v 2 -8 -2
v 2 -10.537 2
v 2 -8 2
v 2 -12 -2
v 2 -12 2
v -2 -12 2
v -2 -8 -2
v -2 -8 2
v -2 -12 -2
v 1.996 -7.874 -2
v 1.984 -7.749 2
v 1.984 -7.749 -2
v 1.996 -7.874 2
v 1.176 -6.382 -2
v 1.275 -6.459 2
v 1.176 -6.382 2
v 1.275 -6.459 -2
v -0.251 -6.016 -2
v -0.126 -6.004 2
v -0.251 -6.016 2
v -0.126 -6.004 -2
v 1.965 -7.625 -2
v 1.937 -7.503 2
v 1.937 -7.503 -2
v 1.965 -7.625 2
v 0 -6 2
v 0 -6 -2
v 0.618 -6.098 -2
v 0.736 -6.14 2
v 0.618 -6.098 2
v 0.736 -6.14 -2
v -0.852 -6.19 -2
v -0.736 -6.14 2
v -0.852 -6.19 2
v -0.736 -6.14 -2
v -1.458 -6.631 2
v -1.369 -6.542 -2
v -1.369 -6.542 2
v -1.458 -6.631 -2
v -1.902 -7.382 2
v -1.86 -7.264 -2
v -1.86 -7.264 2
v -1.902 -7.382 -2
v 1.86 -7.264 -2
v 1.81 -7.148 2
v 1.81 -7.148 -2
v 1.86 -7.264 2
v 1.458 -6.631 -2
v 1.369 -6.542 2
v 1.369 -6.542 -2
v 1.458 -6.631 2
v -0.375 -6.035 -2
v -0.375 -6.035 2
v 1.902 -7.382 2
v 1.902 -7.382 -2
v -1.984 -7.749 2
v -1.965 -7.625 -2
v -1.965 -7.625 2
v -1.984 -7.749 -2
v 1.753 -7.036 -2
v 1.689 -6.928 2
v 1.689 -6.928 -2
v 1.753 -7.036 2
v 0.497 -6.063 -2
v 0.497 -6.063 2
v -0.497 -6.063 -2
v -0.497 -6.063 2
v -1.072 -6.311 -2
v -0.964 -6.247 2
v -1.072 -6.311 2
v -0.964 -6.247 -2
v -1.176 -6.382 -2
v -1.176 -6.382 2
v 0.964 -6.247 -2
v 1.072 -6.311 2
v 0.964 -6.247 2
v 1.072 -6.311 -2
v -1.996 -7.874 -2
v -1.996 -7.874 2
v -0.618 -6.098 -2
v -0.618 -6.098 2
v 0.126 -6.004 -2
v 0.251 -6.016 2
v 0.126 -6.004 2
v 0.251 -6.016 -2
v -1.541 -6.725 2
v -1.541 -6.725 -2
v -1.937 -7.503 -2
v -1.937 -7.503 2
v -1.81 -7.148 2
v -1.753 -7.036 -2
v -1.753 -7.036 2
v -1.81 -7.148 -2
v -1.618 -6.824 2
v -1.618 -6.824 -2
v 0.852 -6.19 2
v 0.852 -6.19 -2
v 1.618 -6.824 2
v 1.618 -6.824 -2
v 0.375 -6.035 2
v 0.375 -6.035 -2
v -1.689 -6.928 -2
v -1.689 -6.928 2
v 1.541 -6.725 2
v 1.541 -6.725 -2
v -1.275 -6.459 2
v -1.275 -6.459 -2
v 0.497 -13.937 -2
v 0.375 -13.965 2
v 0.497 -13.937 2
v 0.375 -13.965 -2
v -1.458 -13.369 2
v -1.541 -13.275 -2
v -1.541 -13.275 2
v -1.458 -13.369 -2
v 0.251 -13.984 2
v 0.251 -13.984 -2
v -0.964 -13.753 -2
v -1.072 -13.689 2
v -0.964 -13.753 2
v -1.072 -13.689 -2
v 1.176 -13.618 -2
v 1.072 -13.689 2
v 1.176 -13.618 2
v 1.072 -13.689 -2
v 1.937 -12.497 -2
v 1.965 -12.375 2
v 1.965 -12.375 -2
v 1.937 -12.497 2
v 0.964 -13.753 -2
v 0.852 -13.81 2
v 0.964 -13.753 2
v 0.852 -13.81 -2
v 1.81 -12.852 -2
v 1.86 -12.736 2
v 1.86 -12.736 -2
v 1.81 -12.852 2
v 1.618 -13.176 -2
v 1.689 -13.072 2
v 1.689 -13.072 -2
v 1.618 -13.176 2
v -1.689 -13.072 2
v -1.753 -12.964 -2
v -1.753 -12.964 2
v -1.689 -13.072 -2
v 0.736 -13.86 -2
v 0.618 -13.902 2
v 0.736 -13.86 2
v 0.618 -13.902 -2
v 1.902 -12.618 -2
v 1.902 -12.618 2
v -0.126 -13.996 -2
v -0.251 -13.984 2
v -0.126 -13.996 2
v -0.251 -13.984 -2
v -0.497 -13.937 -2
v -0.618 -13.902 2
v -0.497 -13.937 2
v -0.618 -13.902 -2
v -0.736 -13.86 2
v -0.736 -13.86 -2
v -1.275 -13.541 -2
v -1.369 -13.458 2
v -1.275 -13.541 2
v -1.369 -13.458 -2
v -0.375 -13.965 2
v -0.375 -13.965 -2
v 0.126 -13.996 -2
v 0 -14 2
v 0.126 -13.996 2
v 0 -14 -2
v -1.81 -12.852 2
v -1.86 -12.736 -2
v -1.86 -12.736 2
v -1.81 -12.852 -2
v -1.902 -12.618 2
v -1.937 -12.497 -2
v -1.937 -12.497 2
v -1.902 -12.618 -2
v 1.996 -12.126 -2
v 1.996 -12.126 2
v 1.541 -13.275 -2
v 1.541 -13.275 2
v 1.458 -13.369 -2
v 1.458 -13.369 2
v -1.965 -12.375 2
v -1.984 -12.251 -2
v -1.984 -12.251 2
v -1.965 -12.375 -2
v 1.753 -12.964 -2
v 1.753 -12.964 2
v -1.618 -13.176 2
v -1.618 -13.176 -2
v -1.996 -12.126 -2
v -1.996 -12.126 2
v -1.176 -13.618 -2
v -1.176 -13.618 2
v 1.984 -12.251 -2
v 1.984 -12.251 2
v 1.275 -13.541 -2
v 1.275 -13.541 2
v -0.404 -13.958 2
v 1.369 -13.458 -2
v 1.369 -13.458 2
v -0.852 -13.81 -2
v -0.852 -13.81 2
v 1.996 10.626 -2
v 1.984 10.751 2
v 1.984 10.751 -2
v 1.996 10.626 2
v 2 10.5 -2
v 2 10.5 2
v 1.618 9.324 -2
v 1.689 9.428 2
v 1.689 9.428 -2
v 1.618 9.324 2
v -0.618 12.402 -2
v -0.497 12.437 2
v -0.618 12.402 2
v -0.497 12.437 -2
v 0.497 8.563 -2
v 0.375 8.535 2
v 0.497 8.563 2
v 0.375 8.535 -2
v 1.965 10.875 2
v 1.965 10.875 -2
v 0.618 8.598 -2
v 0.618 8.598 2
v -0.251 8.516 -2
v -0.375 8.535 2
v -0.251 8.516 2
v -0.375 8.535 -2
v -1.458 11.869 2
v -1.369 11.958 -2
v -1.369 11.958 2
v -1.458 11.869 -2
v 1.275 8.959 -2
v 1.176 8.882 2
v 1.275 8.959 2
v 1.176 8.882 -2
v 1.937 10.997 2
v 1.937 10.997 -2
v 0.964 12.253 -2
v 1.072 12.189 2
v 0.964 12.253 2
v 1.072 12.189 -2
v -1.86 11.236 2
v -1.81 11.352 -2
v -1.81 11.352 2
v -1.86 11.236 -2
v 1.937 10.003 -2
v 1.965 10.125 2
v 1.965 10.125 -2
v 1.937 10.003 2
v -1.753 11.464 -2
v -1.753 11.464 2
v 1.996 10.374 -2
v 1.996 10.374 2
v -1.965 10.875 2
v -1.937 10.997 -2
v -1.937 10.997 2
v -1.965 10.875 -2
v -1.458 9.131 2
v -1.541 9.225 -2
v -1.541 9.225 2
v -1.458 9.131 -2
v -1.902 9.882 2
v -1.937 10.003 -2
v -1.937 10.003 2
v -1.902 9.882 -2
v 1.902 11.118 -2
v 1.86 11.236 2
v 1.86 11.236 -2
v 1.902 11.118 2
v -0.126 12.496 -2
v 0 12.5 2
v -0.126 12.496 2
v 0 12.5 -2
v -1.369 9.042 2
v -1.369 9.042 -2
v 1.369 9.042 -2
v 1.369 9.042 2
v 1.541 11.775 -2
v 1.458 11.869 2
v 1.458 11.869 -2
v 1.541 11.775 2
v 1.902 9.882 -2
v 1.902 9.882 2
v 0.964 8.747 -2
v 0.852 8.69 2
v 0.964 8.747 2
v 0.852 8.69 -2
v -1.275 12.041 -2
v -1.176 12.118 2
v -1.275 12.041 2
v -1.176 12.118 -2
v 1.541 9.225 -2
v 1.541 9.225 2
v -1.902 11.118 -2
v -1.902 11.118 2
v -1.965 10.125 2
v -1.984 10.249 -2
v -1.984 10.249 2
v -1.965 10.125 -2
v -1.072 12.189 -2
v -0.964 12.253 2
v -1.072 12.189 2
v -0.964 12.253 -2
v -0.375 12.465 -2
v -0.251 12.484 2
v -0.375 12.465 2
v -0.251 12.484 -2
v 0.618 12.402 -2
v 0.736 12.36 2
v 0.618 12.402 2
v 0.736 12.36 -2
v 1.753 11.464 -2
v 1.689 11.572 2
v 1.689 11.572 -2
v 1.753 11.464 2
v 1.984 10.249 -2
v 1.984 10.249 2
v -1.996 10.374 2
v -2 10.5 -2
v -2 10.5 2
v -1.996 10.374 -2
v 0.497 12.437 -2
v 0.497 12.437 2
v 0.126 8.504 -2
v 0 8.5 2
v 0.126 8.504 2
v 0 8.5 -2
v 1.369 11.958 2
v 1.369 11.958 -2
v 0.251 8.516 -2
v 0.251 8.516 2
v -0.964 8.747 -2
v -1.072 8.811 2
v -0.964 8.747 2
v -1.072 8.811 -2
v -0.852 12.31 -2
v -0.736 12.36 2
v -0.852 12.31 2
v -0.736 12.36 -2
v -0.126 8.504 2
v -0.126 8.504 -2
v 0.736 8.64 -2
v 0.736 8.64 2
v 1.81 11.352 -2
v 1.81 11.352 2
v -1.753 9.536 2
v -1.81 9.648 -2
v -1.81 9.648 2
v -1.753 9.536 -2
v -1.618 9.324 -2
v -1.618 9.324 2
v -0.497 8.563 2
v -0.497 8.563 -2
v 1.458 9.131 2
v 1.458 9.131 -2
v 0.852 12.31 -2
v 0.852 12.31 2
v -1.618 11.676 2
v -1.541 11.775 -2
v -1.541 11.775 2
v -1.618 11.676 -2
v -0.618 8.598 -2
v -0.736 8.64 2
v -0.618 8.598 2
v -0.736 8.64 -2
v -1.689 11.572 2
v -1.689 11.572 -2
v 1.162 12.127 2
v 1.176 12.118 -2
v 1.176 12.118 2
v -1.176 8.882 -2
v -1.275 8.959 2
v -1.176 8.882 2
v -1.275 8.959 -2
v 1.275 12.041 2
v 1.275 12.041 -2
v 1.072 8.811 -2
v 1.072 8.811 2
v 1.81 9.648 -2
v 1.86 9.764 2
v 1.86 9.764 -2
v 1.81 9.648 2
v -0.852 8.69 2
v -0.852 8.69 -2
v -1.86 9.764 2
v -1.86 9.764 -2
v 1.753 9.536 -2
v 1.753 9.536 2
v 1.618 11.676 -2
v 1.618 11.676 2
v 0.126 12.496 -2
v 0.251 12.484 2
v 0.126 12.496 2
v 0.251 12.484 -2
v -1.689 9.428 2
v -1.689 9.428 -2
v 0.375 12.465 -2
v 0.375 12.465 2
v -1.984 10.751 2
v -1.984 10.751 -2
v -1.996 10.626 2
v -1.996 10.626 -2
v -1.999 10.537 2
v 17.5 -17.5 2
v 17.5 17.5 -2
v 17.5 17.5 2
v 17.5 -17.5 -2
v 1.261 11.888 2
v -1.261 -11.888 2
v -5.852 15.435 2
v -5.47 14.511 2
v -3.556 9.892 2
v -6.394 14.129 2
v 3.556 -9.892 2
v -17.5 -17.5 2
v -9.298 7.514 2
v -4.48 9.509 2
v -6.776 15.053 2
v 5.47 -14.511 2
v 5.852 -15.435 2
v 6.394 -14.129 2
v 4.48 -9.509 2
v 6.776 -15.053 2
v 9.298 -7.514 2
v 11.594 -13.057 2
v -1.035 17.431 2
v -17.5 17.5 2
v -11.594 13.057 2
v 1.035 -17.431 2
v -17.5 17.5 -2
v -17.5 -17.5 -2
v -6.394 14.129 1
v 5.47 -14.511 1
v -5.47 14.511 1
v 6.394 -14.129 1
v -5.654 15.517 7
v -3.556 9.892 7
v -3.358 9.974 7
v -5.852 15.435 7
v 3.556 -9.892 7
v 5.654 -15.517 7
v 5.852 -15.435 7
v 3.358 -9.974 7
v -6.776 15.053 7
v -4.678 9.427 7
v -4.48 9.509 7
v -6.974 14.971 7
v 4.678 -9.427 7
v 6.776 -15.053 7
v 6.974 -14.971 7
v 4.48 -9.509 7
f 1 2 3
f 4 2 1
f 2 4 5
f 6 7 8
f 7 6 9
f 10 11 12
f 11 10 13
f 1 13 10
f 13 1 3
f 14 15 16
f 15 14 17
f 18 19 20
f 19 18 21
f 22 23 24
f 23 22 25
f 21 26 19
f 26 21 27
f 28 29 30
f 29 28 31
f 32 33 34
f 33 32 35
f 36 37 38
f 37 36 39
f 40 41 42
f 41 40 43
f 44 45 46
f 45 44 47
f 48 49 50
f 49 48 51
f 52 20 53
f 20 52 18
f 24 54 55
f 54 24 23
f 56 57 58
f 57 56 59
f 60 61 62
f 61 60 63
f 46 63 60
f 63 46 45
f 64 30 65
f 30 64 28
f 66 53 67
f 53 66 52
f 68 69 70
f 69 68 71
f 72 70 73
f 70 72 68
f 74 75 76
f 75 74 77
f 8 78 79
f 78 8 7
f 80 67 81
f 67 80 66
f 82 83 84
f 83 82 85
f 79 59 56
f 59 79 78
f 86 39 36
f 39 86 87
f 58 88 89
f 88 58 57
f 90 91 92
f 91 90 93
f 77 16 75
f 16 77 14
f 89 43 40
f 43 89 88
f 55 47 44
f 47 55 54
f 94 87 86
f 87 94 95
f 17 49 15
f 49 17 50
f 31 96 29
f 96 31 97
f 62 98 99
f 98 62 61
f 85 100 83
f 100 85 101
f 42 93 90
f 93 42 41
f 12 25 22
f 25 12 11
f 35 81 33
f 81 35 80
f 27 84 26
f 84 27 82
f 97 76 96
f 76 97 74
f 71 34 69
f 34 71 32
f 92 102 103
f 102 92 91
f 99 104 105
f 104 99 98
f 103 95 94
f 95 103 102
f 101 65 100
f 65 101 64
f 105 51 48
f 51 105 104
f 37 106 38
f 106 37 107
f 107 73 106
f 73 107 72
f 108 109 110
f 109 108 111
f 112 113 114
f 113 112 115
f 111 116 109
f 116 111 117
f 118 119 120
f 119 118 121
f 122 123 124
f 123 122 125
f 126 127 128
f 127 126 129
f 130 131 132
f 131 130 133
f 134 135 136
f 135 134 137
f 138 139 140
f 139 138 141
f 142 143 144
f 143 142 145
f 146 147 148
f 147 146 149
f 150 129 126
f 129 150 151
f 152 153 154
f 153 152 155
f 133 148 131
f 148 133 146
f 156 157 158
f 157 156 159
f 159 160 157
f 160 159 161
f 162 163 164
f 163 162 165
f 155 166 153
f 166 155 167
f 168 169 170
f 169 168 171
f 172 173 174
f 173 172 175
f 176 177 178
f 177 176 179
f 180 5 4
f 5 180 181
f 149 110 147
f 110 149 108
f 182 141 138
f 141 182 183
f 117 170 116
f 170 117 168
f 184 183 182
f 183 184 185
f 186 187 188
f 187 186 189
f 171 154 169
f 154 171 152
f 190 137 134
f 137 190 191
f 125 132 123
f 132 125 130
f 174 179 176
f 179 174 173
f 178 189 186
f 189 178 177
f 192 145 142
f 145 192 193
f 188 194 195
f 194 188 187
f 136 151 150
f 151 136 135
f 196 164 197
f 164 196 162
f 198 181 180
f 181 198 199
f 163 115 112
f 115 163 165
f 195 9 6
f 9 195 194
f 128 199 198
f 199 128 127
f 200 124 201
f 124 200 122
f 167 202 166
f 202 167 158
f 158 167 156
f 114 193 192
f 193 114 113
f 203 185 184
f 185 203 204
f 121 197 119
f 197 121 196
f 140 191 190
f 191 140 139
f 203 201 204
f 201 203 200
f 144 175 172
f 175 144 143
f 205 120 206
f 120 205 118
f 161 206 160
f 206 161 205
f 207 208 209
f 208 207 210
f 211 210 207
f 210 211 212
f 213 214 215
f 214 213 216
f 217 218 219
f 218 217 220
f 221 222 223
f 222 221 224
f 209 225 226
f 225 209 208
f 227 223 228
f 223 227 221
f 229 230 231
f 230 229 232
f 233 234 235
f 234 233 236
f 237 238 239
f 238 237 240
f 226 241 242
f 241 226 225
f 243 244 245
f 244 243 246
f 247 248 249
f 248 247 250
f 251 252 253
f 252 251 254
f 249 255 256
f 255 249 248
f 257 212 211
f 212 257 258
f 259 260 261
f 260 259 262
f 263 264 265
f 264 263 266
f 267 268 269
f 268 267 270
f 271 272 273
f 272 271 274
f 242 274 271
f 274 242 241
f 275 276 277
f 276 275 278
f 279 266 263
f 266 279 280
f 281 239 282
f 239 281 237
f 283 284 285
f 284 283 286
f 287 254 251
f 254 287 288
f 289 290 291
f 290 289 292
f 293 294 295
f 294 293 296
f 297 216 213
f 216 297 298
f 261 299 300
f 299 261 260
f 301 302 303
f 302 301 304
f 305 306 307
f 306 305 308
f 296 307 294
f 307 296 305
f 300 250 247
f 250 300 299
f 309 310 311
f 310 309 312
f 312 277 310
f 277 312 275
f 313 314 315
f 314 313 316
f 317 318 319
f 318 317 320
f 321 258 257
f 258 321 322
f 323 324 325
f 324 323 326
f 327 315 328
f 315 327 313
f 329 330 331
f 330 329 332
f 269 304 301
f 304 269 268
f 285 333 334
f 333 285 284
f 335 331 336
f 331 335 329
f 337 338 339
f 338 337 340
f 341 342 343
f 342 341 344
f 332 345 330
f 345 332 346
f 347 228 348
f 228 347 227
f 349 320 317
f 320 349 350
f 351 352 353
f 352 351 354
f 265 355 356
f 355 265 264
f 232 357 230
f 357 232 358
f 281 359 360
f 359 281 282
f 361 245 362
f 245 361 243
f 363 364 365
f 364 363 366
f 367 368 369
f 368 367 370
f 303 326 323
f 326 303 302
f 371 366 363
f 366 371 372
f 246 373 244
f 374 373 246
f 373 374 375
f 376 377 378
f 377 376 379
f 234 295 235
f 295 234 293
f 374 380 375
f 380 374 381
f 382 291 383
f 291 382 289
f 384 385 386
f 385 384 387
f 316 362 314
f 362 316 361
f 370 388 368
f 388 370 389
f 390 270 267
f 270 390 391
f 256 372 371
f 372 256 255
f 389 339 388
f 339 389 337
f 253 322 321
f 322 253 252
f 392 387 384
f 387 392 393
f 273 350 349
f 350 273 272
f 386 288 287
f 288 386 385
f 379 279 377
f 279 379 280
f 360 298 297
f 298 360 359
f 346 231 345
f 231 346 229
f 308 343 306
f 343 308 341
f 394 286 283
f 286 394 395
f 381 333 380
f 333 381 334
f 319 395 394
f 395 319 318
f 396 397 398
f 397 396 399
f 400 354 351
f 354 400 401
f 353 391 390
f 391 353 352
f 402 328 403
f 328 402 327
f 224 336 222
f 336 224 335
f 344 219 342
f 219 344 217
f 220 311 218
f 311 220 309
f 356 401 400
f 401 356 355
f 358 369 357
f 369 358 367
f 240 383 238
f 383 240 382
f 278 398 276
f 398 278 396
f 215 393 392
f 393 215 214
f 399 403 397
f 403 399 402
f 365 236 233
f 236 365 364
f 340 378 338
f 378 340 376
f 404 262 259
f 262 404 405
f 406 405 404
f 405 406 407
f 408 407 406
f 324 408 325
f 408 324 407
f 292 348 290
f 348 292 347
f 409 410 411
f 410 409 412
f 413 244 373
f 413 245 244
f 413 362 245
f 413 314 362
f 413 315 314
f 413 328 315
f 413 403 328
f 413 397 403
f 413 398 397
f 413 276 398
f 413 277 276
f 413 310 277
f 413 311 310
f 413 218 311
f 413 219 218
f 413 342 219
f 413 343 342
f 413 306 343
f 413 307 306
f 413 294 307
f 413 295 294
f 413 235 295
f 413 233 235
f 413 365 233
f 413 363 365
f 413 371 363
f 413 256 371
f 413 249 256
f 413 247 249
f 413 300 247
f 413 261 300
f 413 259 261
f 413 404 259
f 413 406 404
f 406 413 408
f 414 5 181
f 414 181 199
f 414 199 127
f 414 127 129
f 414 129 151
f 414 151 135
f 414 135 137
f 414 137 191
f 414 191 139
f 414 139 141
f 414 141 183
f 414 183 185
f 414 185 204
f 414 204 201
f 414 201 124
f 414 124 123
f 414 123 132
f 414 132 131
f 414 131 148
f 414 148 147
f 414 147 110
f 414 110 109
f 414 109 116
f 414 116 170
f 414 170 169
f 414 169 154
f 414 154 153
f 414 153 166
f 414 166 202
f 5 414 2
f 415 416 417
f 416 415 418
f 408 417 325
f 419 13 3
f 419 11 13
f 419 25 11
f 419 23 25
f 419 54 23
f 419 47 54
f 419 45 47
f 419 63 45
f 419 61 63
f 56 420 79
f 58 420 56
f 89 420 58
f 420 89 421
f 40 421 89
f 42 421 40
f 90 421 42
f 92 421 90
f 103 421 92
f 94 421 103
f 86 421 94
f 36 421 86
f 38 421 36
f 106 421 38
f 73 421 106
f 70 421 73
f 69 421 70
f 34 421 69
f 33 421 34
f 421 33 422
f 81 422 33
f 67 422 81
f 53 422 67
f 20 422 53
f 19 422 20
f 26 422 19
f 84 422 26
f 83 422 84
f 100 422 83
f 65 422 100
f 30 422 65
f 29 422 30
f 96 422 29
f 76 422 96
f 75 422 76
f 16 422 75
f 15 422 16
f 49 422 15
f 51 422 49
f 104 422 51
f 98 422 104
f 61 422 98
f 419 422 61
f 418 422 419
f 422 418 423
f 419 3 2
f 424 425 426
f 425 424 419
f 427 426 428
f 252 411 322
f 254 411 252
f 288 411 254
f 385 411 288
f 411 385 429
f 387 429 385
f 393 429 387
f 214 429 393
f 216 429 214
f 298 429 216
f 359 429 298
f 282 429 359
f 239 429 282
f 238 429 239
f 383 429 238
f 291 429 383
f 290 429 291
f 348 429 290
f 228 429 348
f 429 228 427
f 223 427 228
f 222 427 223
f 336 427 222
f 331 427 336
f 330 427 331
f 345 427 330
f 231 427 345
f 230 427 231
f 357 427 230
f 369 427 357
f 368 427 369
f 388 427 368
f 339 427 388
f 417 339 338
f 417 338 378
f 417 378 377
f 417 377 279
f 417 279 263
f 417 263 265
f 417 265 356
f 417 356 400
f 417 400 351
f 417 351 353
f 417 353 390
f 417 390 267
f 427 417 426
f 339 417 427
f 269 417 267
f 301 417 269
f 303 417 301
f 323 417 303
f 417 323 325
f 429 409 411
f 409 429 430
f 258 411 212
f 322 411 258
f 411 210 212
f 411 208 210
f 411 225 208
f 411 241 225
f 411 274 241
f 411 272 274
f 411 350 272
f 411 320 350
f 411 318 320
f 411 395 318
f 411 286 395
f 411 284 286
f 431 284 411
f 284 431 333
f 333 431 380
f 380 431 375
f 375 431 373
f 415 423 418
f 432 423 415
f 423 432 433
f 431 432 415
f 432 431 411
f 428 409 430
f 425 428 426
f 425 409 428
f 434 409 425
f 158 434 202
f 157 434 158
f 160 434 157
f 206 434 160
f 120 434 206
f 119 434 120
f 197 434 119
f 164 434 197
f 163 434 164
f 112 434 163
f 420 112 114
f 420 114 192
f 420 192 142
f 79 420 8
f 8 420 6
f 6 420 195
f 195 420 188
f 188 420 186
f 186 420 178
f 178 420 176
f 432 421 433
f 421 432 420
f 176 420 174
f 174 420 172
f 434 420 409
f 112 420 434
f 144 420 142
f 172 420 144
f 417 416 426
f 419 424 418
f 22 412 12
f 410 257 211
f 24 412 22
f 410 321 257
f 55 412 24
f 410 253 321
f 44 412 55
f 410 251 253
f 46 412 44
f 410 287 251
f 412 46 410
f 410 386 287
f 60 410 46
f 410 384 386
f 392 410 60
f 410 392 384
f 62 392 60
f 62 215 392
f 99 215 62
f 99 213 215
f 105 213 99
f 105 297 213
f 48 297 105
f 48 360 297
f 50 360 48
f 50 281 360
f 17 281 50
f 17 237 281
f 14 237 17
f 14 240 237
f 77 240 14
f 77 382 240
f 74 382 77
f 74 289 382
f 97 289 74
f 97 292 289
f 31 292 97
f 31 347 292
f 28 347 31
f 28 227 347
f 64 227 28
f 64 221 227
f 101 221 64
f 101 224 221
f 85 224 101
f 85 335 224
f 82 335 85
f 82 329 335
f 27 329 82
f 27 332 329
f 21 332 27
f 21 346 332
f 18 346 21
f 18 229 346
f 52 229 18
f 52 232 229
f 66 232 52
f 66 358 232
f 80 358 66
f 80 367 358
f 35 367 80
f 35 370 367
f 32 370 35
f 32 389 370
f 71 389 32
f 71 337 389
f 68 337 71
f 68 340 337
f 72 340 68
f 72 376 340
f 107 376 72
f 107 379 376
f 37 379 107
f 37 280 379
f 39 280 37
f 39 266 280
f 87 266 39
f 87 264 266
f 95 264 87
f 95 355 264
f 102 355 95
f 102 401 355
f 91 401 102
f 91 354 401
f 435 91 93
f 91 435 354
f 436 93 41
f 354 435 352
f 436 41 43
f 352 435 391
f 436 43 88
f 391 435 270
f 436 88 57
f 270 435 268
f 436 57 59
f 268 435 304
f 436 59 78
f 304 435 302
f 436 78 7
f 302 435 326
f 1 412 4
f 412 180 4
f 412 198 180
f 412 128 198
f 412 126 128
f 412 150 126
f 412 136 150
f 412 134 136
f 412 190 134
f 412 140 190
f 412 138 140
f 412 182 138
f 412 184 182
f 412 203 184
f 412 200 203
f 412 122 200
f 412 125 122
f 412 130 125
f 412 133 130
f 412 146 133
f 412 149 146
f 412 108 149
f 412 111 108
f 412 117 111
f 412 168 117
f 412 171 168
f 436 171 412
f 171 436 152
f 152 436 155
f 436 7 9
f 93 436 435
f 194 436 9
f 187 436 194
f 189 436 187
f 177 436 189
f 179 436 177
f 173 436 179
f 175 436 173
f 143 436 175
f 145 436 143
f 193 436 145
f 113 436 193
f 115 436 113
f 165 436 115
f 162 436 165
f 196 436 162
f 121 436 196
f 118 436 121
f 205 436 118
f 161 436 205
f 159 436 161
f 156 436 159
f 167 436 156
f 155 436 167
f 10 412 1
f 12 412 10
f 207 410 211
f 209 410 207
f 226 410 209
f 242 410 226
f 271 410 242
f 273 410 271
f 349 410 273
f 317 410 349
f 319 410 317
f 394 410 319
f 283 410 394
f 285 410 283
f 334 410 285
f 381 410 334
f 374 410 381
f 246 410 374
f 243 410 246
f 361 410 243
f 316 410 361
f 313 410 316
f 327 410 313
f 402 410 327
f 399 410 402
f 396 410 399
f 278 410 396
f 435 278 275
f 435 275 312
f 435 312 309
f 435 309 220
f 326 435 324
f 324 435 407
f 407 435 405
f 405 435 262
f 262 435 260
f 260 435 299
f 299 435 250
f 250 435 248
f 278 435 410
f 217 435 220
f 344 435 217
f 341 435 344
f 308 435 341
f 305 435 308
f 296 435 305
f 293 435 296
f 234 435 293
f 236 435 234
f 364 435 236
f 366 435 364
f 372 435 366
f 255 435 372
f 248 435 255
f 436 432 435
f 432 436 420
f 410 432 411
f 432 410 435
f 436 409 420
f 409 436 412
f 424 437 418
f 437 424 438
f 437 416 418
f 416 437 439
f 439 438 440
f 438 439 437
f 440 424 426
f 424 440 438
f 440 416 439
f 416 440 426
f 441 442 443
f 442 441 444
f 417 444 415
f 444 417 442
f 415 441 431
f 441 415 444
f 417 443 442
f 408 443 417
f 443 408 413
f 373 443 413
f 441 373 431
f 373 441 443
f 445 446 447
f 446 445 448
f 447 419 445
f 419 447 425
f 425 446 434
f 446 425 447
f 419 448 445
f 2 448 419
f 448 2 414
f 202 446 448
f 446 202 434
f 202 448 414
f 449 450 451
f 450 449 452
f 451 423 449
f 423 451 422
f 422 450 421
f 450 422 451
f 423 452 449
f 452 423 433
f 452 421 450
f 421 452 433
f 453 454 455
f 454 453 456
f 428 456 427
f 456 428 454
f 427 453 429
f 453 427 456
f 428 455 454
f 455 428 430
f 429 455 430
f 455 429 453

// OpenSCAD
union()
{

difference()
{
difference()
{
cube([35,35,4], center = true); //base del portamuestras

union()// unión de las piezas que forman los agujeros
{
translate([0,10.5,-5])
cylinder(r=2, h=10, $fn=100); //agujero pequeño

translate([0,-1.5,0]) //añadido en V2
union()//agujero grande
   {
translate([0,-8.5,-0])
cube([4,4,10], center = true); 
translate([0,-6.5,-5])
cylinder(r=2, h=10, $fn=100);
translate([0,-10.5,-5])
cylinder(r=2, h=10, $fn=100);
   }
   }
}
rotate([0,0,45/2])
translate([-0.5,-15.5,1])
cube([1,31,30], center = false); //ranura para el dispositivo
}

rotate([0,0,45/2])
union()
{
translate([3.25,13.5,0])//4 piezas que sujetan los substratos
difference()
{
translate([0,0,4.5])
cube([5.5,6,5], center = true);

translate([1,0,7])
rotate([0,45,0])
cube([10,10,5], center = true);
}
rotate([0,0,180])
translate([3.25,13.5,0])
difference()
{
translate([0,0,4.5])
cube([5.5,6,5], center = true);

translate([1,0,7])
rotate([0,45,0])
cube([10,10,5], center = true);
}
rotate([0,0,180])
translate([3.25,13.5,0])
rotate([0,0,180])
translate([6.5,0,0])
difference()
{
translate([0,0,4.5])
cube([5.5,6,5], center = true);

translate([1,0,7])
rotate([0,45,0])
cube([10,10,5], center = true);
}
translate([3.25,13.5,0])
rotate([0,0,180])
translate([6.5,0,0])
difference()
{
translate([0,0,4.5])
cube([5.5,6,5], center = true);

translate([1,0,7])
rotate([0,45,0])
cube([10,10,5], center = true);
}
}
}
